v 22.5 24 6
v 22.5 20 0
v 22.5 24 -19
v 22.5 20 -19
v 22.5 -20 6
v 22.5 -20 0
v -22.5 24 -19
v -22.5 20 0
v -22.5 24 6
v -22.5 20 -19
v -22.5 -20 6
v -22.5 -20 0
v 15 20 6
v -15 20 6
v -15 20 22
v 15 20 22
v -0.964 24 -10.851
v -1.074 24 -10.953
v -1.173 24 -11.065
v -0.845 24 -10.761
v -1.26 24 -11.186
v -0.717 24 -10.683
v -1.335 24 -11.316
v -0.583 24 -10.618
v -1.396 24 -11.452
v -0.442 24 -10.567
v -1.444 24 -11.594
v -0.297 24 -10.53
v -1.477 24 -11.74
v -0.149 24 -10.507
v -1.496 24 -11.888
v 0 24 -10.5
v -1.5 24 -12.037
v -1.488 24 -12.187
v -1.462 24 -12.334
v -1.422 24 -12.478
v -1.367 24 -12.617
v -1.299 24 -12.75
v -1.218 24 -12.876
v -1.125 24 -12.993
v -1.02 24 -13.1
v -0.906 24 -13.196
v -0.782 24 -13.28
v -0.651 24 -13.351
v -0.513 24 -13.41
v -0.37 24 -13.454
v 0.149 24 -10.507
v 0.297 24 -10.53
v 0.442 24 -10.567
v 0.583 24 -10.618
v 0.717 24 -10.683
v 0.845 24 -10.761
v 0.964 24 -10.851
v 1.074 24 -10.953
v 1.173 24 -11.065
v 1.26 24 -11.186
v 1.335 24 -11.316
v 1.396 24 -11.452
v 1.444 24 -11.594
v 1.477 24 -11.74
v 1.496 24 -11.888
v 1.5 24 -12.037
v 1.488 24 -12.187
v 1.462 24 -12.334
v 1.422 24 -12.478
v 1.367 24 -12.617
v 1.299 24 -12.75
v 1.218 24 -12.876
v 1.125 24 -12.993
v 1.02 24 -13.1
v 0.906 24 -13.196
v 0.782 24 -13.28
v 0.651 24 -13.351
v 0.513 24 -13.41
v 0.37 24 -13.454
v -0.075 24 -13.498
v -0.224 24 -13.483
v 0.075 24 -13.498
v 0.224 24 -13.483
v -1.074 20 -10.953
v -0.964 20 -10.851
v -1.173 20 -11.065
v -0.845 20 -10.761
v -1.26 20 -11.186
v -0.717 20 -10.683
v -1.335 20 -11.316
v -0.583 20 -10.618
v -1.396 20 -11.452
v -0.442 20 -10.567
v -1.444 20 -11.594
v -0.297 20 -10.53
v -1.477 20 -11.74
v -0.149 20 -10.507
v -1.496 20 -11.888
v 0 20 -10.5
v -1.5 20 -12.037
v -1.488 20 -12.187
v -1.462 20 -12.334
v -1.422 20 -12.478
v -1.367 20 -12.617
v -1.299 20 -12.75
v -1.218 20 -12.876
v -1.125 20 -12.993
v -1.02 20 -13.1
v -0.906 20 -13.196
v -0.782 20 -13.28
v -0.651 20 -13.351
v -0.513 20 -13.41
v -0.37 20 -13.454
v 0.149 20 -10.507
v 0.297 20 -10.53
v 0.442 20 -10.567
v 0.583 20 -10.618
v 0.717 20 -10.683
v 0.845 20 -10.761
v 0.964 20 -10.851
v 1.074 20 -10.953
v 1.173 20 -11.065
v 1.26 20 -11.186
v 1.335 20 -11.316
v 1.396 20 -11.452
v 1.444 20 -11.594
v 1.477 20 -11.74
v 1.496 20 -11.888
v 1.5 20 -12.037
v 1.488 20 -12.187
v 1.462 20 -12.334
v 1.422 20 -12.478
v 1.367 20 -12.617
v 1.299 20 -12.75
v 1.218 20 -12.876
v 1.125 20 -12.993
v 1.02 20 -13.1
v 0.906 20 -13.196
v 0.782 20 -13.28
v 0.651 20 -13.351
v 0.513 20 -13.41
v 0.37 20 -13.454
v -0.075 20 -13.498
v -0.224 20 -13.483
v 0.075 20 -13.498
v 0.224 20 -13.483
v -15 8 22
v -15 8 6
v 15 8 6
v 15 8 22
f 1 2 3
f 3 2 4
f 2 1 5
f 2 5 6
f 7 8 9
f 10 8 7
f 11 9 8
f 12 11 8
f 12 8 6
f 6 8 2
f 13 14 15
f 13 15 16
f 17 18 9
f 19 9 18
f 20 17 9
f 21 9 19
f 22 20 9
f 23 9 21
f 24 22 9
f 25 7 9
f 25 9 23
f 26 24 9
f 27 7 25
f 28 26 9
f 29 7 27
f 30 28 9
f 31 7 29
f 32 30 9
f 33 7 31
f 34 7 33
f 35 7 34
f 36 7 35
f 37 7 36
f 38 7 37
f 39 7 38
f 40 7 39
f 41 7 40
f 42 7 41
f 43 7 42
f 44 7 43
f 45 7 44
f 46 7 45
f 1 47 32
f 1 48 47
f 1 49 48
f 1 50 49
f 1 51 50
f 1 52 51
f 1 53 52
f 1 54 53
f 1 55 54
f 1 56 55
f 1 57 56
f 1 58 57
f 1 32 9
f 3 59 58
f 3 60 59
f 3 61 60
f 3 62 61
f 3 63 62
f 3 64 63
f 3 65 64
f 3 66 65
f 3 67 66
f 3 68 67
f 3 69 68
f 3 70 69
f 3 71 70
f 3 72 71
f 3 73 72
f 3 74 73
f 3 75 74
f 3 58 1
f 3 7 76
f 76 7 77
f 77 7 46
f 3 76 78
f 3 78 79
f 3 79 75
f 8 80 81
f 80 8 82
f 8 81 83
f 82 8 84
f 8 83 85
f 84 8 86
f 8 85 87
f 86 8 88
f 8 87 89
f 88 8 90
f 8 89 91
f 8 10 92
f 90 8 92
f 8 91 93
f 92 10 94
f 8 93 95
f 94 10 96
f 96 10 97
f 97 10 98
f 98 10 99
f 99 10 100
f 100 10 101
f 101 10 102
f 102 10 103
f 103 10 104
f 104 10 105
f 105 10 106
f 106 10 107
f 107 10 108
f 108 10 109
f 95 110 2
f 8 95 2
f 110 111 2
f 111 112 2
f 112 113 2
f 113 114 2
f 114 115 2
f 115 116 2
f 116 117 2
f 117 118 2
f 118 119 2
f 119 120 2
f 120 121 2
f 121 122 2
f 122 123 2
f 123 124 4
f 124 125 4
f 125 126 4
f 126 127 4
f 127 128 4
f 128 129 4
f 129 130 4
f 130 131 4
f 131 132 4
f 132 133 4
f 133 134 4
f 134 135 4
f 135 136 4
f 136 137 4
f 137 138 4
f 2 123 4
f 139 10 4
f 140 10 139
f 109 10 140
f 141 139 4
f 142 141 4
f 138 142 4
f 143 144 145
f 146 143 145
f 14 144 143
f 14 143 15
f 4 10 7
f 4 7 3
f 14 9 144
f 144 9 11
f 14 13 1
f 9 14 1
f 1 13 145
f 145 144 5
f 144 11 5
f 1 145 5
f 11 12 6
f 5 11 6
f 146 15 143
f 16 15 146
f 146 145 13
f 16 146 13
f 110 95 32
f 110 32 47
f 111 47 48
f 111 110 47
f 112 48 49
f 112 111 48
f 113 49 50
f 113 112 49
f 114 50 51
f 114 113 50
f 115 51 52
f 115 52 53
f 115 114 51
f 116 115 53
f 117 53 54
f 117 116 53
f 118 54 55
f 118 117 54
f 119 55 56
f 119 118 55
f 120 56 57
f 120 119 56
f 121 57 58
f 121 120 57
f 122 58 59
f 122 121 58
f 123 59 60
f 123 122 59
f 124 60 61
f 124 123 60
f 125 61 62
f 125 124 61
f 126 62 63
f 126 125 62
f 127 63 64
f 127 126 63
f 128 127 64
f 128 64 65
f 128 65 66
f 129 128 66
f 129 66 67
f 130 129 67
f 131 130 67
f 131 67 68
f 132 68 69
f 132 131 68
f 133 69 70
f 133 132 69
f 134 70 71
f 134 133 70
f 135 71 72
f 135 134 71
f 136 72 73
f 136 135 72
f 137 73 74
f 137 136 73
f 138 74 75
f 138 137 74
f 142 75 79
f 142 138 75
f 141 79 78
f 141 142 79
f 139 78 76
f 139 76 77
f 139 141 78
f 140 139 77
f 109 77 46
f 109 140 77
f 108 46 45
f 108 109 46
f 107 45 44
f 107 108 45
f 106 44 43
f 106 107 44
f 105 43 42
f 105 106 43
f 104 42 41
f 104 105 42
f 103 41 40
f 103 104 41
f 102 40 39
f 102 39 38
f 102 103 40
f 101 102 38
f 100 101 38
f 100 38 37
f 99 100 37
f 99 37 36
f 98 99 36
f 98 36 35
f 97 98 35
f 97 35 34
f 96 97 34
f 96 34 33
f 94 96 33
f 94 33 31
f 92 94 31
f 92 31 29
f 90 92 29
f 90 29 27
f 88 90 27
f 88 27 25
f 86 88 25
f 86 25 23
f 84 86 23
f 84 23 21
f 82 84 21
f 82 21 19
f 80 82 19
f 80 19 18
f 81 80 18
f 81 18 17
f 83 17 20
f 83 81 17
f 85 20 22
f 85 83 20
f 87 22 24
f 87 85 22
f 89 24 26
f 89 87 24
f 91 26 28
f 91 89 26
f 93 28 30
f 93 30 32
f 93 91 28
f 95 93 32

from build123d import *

# Parameters (mm, degrees)
SKETCH1_W           = 45
SKETCH1_H           = 40
BOSS_EXTRUDE1_DEPTH = 6
SKETCH2_W           = 30
SKETCH2_H           = 12
BOSS_EXTRUDE2_DEPTH = 16
SKETCH3_W           = 45
SKETCH3_H           = 25
SKETCH3_R           = 1.5
BOSS_EXTRUDE3_DEPTH = 4


with BuildPart() as part:
    # Sketch1 → Boss-Extrude1 (new body)
    with BuildSketch(Plane.XY):
        Rectangle(SKETCH1_W, SKETCH1_H)
    extrude(amount=BOSS_EXTRUDE1_DEPTH)

    # Sketch2 → Boss-Extrude2 (add)
    with BuildSketch(Plane.XY.offset(6)):
        with Locations((0, 14)):
            Rectangle(SKETCH2_W, SKETCH2_H)
    extrude(amount=BOSS_EXTRUDE2_DEPTH)

    # Sketch3 → Boss-Extrude3 (add)
    with BuildSketch(Plane(origin=(0, 20, 0), x_dir=(1, 0, 0), z_dir=(0, 1, 0))):
        with Locations((0, 6.5)):
            Rectangle(SKETCH3_W, SKETCH3_H)
        with Locations(Location((0, 12, 0), (0, 0, 270))):
            Circle(SKETCH3_R, mode=Mode.SUBTRACT)
    extrude(amount=BOSS_EXTRUDE3_DEPTH)


solid = part.part
